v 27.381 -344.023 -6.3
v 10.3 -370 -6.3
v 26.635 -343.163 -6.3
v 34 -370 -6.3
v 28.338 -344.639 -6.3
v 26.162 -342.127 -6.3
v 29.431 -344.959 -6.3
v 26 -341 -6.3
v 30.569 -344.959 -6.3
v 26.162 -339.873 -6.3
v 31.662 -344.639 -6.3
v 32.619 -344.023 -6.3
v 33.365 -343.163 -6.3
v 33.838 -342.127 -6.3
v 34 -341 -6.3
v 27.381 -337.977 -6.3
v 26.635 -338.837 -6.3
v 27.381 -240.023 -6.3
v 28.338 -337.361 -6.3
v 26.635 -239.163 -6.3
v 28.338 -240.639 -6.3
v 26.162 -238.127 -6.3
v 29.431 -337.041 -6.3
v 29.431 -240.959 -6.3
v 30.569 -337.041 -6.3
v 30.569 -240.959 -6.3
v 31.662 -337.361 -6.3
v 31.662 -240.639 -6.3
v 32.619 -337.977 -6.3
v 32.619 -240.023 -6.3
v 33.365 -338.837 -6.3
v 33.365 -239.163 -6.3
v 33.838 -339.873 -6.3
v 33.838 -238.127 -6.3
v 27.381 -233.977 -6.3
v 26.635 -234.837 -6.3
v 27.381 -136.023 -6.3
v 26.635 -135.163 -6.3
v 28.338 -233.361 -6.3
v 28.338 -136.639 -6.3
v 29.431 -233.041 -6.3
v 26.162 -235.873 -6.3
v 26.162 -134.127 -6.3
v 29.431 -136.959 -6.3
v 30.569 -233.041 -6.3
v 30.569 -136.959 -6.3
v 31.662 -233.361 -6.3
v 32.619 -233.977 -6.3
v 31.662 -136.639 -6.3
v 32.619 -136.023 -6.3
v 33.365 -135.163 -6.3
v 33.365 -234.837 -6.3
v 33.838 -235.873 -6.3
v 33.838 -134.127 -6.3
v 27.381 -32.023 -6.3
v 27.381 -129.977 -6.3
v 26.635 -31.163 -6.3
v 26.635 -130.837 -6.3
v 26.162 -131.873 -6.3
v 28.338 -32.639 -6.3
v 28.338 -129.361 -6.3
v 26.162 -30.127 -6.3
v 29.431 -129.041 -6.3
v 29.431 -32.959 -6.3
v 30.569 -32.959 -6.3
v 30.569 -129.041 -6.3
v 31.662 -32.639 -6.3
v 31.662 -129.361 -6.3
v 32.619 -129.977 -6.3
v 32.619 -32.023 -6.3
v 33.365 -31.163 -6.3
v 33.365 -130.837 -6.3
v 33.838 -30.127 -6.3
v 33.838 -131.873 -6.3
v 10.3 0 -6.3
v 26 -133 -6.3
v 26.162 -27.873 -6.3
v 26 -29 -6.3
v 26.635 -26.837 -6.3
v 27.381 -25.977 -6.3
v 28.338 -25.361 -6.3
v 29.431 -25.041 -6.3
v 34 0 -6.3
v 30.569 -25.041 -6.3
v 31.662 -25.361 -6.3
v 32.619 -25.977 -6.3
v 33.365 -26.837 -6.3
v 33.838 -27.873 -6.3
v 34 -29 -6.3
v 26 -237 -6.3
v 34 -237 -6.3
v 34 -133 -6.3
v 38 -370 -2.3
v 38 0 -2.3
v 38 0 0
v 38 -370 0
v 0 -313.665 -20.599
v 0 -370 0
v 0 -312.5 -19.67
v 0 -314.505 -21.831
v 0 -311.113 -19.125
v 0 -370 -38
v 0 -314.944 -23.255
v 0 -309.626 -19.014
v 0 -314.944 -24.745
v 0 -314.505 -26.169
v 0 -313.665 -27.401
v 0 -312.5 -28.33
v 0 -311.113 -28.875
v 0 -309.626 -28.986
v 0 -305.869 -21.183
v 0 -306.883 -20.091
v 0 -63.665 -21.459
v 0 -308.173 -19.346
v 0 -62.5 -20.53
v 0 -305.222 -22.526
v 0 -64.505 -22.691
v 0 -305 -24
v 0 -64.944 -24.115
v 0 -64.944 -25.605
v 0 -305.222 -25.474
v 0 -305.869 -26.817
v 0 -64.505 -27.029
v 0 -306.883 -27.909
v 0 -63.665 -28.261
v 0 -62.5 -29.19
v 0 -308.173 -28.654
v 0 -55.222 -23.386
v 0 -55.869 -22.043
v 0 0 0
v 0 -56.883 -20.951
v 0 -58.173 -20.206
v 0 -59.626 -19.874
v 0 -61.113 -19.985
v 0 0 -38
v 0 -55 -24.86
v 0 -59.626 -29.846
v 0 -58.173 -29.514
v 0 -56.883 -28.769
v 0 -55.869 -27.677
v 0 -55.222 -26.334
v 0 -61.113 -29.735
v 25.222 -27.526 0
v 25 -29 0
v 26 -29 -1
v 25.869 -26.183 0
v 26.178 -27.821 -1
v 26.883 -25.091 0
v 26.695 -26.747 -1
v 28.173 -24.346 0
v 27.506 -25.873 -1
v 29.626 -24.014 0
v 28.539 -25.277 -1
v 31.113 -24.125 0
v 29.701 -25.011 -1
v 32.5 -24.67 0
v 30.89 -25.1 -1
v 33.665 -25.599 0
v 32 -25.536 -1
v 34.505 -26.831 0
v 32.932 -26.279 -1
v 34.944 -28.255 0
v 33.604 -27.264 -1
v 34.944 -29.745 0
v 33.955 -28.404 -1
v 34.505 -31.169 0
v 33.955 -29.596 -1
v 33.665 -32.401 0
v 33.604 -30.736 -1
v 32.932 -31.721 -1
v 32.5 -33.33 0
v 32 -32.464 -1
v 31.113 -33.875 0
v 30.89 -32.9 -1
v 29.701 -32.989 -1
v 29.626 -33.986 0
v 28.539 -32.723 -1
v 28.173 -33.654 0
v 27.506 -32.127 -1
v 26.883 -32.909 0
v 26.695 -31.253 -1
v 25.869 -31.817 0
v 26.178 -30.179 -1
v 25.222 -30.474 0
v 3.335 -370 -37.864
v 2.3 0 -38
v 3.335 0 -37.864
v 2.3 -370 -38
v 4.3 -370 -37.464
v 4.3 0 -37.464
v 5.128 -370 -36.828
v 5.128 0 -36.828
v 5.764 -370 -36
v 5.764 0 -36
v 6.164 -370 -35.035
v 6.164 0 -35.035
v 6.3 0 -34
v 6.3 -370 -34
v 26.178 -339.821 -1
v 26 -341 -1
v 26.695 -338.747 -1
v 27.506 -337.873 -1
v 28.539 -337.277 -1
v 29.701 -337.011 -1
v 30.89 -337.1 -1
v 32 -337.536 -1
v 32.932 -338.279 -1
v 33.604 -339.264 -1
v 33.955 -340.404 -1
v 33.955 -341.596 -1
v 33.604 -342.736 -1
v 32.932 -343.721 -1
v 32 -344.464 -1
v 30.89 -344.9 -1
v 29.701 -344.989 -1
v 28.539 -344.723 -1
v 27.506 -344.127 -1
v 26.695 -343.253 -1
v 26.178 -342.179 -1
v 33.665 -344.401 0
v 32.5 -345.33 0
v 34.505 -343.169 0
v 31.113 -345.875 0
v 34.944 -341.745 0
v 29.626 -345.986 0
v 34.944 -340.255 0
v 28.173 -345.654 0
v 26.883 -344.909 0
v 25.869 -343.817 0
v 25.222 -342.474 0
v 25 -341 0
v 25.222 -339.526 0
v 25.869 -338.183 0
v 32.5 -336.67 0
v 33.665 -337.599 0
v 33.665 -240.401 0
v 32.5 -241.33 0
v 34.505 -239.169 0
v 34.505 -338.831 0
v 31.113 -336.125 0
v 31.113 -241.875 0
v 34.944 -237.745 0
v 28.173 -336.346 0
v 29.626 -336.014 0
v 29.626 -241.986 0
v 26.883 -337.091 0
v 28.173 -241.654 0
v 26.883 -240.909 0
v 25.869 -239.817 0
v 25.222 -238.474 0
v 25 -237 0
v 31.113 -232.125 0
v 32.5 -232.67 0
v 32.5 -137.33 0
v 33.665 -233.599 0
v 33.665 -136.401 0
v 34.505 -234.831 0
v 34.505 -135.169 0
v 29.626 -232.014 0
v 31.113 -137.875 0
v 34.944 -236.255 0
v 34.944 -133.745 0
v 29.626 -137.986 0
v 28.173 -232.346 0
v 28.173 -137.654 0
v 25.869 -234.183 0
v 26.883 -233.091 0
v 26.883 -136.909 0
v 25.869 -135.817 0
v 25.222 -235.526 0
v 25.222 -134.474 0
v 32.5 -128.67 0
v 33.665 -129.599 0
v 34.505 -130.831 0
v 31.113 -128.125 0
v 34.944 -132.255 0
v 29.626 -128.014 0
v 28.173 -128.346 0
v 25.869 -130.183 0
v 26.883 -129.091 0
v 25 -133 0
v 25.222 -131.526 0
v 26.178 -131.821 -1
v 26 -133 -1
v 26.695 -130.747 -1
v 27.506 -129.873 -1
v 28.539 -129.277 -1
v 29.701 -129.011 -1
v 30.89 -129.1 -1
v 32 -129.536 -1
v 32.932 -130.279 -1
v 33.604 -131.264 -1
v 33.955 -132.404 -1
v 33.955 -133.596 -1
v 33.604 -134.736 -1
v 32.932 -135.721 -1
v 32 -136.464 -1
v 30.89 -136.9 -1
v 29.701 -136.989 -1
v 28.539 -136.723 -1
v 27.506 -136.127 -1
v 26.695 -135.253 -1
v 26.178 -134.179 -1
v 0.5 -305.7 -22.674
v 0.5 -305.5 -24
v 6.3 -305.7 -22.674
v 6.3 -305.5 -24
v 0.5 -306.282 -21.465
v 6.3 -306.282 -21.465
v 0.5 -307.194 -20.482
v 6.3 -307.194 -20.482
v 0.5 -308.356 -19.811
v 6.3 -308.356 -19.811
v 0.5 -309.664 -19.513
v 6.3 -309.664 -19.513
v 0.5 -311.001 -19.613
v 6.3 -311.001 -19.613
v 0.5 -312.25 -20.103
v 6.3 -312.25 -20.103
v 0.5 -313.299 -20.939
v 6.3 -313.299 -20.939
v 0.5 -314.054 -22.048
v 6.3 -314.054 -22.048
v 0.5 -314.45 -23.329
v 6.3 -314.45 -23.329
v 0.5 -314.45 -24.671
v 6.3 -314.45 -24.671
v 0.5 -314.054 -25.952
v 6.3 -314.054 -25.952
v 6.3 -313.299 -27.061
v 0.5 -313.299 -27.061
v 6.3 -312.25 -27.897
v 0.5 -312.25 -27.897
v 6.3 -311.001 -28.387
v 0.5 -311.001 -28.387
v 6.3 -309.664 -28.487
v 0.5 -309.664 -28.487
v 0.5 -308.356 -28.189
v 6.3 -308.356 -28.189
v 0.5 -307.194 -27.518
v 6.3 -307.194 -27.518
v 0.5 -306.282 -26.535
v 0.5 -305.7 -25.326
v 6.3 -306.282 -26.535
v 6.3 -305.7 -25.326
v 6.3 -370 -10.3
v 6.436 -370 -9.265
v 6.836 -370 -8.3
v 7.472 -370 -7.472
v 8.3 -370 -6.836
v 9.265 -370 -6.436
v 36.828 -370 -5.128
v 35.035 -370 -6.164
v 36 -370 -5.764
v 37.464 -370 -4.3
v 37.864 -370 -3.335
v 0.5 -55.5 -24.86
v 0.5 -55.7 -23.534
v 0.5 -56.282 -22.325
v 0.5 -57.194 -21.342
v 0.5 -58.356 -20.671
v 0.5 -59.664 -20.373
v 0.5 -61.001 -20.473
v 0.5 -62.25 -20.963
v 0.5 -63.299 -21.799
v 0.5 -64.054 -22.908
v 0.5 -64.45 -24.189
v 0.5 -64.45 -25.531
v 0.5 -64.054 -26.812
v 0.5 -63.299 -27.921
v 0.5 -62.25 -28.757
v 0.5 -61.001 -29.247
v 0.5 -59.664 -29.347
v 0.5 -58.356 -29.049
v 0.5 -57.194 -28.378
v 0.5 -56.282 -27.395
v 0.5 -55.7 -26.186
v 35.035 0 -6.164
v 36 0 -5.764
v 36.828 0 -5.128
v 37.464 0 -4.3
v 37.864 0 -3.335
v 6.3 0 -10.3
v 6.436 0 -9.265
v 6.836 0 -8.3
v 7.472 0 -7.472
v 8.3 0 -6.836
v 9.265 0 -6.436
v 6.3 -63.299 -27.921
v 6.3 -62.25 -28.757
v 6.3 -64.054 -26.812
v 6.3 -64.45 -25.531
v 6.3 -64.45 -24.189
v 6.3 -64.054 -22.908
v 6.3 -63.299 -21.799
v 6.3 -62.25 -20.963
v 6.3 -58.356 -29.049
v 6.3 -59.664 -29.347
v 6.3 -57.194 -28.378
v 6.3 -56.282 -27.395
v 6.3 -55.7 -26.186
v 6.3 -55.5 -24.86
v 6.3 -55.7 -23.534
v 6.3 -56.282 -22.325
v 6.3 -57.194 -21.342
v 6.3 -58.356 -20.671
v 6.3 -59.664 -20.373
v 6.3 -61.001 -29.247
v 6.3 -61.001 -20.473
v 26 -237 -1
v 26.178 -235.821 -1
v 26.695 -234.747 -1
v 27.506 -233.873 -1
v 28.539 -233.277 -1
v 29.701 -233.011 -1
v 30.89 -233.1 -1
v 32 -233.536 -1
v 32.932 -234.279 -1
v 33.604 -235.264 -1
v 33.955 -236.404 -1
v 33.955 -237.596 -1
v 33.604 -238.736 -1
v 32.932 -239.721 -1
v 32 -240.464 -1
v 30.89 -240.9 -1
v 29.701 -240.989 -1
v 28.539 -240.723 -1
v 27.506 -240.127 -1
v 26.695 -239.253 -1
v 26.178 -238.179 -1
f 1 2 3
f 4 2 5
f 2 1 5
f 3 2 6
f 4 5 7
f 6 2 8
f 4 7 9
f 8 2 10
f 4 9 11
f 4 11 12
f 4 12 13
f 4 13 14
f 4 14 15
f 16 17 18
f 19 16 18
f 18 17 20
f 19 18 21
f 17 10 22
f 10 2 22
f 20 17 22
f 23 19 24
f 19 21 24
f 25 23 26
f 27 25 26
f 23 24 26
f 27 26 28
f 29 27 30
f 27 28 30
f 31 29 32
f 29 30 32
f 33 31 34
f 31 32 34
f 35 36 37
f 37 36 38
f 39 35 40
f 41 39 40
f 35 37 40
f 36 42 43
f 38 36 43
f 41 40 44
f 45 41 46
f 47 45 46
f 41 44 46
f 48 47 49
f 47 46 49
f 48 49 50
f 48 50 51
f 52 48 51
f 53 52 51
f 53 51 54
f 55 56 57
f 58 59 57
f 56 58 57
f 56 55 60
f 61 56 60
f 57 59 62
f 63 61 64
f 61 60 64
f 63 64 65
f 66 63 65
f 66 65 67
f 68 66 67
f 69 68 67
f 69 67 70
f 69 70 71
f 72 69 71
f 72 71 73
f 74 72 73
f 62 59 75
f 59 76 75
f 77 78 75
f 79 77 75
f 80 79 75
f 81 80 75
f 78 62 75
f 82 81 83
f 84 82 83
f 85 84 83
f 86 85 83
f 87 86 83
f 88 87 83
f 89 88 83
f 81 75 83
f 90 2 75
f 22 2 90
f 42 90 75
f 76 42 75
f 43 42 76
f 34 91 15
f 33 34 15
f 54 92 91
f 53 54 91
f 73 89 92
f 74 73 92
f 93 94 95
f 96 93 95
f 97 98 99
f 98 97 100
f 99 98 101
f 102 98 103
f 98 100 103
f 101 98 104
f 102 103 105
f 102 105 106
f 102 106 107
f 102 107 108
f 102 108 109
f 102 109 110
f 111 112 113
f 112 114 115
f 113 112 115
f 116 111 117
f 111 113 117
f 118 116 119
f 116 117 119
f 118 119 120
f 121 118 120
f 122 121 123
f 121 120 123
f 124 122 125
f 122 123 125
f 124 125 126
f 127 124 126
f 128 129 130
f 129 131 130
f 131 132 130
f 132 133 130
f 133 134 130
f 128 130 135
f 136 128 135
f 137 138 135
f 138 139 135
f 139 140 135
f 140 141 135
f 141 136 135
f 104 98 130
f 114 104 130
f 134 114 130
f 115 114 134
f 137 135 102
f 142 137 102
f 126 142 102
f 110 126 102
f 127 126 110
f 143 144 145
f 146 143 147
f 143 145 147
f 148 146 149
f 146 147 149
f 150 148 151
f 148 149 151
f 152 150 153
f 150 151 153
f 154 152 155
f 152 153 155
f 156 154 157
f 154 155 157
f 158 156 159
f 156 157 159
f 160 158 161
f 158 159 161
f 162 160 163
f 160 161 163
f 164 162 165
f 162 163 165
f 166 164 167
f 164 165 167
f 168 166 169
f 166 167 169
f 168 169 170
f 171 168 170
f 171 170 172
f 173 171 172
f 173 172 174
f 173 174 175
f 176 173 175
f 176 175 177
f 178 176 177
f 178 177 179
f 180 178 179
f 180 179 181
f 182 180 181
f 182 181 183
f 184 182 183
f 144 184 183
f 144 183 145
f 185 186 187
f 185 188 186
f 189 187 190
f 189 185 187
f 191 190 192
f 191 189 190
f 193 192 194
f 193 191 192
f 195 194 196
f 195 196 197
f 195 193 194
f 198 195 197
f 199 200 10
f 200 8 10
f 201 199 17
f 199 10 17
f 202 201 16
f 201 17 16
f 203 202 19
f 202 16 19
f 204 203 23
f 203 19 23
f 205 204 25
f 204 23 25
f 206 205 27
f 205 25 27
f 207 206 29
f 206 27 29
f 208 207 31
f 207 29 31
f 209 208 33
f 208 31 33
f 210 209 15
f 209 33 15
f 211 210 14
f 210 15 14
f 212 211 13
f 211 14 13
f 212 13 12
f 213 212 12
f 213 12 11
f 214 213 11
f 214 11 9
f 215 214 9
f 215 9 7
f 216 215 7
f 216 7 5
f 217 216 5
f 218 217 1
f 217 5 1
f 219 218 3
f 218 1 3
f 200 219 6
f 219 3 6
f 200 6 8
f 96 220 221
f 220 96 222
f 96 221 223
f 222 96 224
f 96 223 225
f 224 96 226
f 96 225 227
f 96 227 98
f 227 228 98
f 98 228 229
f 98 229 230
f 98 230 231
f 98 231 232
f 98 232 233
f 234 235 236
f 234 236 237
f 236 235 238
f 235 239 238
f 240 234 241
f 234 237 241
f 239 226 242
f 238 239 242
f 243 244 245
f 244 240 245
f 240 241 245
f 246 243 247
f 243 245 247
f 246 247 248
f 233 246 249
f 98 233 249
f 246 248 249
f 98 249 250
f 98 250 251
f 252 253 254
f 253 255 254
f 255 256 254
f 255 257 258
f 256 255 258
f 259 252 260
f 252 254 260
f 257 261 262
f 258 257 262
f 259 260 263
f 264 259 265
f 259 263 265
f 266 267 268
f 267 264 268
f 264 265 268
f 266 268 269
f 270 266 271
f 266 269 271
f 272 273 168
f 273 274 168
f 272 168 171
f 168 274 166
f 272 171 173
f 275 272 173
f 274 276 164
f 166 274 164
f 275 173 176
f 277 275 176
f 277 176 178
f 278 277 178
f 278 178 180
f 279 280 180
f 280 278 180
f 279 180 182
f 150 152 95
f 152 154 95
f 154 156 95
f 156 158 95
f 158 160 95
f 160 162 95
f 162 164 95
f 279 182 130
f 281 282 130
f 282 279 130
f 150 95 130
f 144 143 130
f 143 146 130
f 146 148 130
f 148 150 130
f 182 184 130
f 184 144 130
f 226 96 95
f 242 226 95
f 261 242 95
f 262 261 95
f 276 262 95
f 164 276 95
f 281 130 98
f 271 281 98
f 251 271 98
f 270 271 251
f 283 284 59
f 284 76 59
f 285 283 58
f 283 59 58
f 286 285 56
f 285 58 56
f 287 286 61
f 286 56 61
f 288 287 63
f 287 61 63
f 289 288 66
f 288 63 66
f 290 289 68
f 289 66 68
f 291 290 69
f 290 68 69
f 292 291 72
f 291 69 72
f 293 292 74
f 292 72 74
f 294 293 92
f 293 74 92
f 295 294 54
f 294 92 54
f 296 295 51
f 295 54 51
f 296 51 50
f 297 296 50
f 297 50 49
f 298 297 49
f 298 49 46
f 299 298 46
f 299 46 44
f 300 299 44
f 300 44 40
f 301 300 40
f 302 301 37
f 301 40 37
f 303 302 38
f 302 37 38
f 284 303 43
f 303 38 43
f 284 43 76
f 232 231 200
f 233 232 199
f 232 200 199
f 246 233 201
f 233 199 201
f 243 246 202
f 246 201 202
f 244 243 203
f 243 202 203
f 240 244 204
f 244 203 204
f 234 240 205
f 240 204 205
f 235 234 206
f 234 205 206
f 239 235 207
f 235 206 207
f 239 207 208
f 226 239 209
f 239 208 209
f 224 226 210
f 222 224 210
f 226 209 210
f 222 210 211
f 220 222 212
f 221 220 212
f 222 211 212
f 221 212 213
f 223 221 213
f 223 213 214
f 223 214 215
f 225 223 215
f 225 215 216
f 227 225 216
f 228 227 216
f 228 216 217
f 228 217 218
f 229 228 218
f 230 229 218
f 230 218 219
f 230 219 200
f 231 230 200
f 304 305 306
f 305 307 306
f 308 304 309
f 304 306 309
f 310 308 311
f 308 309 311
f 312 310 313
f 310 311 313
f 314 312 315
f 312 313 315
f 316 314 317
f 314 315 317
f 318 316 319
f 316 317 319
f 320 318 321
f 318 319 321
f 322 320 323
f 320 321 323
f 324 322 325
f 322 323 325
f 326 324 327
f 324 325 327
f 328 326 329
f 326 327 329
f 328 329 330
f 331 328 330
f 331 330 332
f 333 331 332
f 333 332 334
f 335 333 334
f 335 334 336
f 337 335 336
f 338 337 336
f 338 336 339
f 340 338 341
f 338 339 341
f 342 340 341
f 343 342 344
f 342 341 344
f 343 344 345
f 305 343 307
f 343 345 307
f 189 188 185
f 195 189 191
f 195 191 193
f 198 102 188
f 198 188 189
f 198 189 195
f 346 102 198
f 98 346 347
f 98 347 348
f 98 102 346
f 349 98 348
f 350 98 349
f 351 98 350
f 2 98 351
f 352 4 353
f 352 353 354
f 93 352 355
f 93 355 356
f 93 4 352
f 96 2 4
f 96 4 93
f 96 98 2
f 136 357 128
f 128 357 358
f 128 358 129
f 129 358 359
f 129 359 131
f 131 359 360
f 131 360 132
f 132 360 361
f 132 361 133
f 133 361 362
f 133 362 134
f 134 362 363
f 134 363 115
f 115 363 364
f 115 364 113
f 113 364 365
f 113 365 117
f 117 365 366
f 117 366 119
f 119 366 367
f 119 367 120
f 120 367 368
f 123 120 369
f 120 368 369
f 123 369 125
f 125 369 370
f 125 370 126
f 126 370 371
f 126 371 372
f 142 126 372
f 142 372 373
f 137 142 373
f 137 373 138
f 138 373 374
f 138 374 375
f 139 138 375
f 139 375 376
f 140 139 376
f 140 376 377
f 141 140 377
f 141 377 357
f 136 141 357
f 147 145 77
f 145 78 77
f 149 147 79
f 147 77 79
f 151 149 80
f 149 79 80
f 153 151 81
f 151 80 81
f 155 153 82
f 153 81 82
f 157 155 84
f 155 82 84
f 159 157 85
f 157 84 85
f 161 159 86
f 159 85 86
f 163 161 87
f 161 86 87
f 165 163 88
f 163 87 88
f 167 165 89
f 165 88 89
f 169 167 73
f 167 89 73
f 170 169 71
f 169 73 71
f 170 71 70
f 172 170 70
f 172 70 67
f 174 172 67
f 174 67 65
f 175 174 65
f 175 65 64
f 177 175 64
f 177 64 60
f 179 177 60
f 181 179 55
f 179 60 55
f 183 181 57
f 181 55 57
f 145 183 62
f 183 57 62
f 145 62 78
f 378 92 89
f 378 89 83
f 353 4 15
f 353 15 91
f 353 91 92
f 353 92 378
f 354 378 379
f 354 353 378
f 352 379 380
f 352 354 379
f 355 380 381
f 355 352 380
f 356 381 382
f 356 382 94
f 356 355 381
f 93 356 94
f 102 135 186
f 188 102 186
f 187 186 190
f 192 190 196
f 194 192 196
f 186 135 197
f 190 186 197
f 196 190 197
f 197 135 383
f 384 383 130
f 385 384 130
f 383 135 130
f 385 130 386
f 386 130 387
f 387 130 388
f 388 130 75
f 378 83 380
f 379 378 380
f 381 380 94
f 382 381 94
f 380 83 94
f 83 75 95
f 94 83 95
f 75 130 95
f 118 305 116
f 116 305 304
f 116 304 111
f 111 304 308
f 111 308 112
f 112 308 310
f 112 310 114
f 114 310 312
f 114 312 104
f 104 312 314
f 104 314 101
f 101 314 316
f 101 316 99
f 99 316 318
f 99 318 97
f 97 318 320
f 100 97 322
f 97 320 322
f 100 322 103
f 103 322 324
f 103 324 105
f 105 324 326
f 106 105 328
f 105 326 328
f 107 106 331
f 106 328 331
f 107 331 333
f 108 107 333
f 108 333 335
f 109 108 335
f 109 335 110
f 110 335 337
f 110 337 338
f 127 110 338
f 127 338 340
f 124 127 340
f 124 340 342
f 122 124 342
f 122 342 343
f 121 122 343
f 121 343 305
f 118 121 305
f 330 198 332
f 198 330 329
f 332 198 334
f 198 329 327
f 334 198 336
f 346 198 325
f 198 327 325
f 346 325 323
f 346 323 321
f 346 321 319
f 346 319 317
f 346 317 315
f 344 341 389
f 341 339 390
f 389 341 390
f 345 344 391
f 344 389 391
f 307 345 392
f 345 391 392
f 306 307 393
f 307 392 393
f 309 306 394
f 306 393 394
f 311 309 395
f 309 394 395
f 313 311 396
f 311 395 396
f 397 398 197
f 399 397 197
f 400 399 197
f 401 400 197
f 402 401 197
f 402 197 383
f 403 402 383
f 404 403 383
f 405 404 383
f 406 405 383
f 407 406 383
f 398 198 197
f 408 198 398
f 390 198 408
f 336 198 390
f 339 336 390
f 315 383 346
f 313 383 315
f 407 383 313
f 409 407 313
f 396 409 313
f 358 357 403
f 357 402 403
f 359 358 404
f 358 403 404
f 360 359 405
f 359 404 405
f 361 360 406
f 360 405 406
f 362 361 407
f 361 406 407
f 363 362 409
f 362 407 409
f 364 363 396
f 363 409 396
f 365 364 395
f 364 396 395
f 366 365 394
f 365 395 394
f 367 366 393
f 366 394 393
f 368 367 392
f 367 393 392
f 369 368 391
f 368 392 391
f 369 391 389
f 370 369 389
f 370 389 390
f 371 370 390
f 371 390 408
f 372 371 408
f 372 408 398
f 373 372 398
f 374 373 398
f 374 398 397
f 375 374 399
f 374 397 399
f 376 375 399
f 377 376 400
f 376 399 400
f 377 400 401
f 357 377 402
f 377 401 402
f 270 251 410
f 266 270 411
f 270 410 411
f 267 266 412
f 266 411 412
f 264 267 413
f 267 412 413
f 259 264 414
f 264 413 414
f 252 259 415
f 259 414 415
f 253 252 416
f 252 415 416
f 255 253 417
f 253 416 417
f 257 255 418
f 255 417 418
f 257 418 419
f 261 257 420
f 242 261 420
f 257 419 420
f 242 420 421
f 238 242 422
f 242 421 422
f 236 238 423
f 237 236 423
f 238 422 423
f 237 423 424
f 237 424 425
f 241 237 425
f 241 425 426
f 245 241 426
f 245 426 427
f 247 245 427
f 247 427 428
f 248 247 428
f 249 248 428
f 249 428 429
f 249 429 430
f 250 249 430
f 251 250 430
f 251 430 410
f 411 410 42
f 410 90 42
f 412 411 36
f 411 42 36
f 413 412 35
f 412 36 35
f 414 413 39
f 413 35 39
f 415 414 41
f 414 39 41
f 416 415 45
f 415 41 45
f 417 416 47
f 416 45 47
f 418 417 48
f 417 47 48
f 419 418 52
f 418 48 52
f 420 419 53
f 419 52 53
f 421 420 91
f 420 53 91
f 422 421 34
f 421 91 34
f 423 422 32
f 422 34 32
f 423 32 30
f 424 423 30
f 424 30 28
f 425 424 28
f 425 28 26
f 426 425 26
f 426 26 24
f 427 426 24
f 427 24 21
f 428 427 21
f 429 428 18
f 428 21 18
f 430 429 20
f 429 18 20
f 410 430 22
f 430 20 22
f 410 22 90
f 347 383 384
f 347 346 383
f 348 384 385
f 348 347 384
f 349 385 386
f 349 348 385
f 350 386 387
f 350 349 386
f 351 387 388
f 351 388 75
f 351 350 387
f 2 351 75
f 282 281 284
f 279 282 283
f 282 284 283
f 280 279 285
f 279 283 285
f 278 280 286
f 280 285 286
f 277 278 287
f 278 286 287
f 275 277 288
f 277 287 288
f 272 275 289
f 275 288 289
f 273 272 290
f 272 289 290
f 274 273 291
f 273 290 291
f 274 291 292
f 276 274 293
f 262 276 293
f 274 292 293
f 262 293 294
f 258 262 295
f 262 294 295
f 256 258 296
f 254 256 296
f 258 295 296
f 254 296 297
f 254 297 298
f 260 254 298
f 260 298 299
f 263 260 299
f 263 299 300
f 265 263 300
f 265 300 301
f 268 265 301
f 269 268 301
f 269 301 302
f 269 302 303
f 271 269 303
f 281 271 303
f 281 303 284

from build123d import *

# Parameters (mm, degrees)
F1_DEPTH       = 370
F2_R           = 4
F3_R           = 4
F5_D           = 8
F5_CSINK_D     = 10
F5_CSINK_ANGLE = 90
F7_D           = 9
F7_CSINK_D     = 10
F7_CSINK_ANGLE = 90


with BuildPart() as f1:
    # F0 (on Front) → F1 (new body)
    with BuildSketch(Plane.XZ):
        Polygon((38, 0), (0, 0), (0, -38), (6.3, -38), (6.3, -6.3), (38, -6.3), align=None)
    extrude(amount=F1_DEPTH)

    # F2
    f2_edges = [f1.edges().sort_by_distance(p)[0] for p in [
        (6.3, -185, -38),
        (38, -185, -6.3),
    ]]
    fillet(f2_edges, radius=F2_R)

    # F3
    f3_edges = [f1.edges().sort_by_distance(p)[0] for p in [
        (6.3, -185, -6.3),
    ]]
    fillet(f3_edges, radius=F3_R)

    # F5 (through all)
    with Locations(Plane.XY):
        with Locations((30, -341), (30, -237), (30, -133), (30, -29)):
            CounterSinkHole(F5_D / 2, F5_CSINK_D / 2, counter_sink_angle=F5_CSINK_ANGLE)

    # F7 (through all)
    with Locations(Plane(origin=(0, 0, 0), x_dir=(0, -1, 0), z_dir=(-1, 0, 0))):
        with Locations((310, -24), (60, -24.86)):
            CounterSinkHole(F7_D / 2, F7_CSINK_D / 2, counter_sink_angle=F7_CSINK_ANGLE)


solid = f1.part
